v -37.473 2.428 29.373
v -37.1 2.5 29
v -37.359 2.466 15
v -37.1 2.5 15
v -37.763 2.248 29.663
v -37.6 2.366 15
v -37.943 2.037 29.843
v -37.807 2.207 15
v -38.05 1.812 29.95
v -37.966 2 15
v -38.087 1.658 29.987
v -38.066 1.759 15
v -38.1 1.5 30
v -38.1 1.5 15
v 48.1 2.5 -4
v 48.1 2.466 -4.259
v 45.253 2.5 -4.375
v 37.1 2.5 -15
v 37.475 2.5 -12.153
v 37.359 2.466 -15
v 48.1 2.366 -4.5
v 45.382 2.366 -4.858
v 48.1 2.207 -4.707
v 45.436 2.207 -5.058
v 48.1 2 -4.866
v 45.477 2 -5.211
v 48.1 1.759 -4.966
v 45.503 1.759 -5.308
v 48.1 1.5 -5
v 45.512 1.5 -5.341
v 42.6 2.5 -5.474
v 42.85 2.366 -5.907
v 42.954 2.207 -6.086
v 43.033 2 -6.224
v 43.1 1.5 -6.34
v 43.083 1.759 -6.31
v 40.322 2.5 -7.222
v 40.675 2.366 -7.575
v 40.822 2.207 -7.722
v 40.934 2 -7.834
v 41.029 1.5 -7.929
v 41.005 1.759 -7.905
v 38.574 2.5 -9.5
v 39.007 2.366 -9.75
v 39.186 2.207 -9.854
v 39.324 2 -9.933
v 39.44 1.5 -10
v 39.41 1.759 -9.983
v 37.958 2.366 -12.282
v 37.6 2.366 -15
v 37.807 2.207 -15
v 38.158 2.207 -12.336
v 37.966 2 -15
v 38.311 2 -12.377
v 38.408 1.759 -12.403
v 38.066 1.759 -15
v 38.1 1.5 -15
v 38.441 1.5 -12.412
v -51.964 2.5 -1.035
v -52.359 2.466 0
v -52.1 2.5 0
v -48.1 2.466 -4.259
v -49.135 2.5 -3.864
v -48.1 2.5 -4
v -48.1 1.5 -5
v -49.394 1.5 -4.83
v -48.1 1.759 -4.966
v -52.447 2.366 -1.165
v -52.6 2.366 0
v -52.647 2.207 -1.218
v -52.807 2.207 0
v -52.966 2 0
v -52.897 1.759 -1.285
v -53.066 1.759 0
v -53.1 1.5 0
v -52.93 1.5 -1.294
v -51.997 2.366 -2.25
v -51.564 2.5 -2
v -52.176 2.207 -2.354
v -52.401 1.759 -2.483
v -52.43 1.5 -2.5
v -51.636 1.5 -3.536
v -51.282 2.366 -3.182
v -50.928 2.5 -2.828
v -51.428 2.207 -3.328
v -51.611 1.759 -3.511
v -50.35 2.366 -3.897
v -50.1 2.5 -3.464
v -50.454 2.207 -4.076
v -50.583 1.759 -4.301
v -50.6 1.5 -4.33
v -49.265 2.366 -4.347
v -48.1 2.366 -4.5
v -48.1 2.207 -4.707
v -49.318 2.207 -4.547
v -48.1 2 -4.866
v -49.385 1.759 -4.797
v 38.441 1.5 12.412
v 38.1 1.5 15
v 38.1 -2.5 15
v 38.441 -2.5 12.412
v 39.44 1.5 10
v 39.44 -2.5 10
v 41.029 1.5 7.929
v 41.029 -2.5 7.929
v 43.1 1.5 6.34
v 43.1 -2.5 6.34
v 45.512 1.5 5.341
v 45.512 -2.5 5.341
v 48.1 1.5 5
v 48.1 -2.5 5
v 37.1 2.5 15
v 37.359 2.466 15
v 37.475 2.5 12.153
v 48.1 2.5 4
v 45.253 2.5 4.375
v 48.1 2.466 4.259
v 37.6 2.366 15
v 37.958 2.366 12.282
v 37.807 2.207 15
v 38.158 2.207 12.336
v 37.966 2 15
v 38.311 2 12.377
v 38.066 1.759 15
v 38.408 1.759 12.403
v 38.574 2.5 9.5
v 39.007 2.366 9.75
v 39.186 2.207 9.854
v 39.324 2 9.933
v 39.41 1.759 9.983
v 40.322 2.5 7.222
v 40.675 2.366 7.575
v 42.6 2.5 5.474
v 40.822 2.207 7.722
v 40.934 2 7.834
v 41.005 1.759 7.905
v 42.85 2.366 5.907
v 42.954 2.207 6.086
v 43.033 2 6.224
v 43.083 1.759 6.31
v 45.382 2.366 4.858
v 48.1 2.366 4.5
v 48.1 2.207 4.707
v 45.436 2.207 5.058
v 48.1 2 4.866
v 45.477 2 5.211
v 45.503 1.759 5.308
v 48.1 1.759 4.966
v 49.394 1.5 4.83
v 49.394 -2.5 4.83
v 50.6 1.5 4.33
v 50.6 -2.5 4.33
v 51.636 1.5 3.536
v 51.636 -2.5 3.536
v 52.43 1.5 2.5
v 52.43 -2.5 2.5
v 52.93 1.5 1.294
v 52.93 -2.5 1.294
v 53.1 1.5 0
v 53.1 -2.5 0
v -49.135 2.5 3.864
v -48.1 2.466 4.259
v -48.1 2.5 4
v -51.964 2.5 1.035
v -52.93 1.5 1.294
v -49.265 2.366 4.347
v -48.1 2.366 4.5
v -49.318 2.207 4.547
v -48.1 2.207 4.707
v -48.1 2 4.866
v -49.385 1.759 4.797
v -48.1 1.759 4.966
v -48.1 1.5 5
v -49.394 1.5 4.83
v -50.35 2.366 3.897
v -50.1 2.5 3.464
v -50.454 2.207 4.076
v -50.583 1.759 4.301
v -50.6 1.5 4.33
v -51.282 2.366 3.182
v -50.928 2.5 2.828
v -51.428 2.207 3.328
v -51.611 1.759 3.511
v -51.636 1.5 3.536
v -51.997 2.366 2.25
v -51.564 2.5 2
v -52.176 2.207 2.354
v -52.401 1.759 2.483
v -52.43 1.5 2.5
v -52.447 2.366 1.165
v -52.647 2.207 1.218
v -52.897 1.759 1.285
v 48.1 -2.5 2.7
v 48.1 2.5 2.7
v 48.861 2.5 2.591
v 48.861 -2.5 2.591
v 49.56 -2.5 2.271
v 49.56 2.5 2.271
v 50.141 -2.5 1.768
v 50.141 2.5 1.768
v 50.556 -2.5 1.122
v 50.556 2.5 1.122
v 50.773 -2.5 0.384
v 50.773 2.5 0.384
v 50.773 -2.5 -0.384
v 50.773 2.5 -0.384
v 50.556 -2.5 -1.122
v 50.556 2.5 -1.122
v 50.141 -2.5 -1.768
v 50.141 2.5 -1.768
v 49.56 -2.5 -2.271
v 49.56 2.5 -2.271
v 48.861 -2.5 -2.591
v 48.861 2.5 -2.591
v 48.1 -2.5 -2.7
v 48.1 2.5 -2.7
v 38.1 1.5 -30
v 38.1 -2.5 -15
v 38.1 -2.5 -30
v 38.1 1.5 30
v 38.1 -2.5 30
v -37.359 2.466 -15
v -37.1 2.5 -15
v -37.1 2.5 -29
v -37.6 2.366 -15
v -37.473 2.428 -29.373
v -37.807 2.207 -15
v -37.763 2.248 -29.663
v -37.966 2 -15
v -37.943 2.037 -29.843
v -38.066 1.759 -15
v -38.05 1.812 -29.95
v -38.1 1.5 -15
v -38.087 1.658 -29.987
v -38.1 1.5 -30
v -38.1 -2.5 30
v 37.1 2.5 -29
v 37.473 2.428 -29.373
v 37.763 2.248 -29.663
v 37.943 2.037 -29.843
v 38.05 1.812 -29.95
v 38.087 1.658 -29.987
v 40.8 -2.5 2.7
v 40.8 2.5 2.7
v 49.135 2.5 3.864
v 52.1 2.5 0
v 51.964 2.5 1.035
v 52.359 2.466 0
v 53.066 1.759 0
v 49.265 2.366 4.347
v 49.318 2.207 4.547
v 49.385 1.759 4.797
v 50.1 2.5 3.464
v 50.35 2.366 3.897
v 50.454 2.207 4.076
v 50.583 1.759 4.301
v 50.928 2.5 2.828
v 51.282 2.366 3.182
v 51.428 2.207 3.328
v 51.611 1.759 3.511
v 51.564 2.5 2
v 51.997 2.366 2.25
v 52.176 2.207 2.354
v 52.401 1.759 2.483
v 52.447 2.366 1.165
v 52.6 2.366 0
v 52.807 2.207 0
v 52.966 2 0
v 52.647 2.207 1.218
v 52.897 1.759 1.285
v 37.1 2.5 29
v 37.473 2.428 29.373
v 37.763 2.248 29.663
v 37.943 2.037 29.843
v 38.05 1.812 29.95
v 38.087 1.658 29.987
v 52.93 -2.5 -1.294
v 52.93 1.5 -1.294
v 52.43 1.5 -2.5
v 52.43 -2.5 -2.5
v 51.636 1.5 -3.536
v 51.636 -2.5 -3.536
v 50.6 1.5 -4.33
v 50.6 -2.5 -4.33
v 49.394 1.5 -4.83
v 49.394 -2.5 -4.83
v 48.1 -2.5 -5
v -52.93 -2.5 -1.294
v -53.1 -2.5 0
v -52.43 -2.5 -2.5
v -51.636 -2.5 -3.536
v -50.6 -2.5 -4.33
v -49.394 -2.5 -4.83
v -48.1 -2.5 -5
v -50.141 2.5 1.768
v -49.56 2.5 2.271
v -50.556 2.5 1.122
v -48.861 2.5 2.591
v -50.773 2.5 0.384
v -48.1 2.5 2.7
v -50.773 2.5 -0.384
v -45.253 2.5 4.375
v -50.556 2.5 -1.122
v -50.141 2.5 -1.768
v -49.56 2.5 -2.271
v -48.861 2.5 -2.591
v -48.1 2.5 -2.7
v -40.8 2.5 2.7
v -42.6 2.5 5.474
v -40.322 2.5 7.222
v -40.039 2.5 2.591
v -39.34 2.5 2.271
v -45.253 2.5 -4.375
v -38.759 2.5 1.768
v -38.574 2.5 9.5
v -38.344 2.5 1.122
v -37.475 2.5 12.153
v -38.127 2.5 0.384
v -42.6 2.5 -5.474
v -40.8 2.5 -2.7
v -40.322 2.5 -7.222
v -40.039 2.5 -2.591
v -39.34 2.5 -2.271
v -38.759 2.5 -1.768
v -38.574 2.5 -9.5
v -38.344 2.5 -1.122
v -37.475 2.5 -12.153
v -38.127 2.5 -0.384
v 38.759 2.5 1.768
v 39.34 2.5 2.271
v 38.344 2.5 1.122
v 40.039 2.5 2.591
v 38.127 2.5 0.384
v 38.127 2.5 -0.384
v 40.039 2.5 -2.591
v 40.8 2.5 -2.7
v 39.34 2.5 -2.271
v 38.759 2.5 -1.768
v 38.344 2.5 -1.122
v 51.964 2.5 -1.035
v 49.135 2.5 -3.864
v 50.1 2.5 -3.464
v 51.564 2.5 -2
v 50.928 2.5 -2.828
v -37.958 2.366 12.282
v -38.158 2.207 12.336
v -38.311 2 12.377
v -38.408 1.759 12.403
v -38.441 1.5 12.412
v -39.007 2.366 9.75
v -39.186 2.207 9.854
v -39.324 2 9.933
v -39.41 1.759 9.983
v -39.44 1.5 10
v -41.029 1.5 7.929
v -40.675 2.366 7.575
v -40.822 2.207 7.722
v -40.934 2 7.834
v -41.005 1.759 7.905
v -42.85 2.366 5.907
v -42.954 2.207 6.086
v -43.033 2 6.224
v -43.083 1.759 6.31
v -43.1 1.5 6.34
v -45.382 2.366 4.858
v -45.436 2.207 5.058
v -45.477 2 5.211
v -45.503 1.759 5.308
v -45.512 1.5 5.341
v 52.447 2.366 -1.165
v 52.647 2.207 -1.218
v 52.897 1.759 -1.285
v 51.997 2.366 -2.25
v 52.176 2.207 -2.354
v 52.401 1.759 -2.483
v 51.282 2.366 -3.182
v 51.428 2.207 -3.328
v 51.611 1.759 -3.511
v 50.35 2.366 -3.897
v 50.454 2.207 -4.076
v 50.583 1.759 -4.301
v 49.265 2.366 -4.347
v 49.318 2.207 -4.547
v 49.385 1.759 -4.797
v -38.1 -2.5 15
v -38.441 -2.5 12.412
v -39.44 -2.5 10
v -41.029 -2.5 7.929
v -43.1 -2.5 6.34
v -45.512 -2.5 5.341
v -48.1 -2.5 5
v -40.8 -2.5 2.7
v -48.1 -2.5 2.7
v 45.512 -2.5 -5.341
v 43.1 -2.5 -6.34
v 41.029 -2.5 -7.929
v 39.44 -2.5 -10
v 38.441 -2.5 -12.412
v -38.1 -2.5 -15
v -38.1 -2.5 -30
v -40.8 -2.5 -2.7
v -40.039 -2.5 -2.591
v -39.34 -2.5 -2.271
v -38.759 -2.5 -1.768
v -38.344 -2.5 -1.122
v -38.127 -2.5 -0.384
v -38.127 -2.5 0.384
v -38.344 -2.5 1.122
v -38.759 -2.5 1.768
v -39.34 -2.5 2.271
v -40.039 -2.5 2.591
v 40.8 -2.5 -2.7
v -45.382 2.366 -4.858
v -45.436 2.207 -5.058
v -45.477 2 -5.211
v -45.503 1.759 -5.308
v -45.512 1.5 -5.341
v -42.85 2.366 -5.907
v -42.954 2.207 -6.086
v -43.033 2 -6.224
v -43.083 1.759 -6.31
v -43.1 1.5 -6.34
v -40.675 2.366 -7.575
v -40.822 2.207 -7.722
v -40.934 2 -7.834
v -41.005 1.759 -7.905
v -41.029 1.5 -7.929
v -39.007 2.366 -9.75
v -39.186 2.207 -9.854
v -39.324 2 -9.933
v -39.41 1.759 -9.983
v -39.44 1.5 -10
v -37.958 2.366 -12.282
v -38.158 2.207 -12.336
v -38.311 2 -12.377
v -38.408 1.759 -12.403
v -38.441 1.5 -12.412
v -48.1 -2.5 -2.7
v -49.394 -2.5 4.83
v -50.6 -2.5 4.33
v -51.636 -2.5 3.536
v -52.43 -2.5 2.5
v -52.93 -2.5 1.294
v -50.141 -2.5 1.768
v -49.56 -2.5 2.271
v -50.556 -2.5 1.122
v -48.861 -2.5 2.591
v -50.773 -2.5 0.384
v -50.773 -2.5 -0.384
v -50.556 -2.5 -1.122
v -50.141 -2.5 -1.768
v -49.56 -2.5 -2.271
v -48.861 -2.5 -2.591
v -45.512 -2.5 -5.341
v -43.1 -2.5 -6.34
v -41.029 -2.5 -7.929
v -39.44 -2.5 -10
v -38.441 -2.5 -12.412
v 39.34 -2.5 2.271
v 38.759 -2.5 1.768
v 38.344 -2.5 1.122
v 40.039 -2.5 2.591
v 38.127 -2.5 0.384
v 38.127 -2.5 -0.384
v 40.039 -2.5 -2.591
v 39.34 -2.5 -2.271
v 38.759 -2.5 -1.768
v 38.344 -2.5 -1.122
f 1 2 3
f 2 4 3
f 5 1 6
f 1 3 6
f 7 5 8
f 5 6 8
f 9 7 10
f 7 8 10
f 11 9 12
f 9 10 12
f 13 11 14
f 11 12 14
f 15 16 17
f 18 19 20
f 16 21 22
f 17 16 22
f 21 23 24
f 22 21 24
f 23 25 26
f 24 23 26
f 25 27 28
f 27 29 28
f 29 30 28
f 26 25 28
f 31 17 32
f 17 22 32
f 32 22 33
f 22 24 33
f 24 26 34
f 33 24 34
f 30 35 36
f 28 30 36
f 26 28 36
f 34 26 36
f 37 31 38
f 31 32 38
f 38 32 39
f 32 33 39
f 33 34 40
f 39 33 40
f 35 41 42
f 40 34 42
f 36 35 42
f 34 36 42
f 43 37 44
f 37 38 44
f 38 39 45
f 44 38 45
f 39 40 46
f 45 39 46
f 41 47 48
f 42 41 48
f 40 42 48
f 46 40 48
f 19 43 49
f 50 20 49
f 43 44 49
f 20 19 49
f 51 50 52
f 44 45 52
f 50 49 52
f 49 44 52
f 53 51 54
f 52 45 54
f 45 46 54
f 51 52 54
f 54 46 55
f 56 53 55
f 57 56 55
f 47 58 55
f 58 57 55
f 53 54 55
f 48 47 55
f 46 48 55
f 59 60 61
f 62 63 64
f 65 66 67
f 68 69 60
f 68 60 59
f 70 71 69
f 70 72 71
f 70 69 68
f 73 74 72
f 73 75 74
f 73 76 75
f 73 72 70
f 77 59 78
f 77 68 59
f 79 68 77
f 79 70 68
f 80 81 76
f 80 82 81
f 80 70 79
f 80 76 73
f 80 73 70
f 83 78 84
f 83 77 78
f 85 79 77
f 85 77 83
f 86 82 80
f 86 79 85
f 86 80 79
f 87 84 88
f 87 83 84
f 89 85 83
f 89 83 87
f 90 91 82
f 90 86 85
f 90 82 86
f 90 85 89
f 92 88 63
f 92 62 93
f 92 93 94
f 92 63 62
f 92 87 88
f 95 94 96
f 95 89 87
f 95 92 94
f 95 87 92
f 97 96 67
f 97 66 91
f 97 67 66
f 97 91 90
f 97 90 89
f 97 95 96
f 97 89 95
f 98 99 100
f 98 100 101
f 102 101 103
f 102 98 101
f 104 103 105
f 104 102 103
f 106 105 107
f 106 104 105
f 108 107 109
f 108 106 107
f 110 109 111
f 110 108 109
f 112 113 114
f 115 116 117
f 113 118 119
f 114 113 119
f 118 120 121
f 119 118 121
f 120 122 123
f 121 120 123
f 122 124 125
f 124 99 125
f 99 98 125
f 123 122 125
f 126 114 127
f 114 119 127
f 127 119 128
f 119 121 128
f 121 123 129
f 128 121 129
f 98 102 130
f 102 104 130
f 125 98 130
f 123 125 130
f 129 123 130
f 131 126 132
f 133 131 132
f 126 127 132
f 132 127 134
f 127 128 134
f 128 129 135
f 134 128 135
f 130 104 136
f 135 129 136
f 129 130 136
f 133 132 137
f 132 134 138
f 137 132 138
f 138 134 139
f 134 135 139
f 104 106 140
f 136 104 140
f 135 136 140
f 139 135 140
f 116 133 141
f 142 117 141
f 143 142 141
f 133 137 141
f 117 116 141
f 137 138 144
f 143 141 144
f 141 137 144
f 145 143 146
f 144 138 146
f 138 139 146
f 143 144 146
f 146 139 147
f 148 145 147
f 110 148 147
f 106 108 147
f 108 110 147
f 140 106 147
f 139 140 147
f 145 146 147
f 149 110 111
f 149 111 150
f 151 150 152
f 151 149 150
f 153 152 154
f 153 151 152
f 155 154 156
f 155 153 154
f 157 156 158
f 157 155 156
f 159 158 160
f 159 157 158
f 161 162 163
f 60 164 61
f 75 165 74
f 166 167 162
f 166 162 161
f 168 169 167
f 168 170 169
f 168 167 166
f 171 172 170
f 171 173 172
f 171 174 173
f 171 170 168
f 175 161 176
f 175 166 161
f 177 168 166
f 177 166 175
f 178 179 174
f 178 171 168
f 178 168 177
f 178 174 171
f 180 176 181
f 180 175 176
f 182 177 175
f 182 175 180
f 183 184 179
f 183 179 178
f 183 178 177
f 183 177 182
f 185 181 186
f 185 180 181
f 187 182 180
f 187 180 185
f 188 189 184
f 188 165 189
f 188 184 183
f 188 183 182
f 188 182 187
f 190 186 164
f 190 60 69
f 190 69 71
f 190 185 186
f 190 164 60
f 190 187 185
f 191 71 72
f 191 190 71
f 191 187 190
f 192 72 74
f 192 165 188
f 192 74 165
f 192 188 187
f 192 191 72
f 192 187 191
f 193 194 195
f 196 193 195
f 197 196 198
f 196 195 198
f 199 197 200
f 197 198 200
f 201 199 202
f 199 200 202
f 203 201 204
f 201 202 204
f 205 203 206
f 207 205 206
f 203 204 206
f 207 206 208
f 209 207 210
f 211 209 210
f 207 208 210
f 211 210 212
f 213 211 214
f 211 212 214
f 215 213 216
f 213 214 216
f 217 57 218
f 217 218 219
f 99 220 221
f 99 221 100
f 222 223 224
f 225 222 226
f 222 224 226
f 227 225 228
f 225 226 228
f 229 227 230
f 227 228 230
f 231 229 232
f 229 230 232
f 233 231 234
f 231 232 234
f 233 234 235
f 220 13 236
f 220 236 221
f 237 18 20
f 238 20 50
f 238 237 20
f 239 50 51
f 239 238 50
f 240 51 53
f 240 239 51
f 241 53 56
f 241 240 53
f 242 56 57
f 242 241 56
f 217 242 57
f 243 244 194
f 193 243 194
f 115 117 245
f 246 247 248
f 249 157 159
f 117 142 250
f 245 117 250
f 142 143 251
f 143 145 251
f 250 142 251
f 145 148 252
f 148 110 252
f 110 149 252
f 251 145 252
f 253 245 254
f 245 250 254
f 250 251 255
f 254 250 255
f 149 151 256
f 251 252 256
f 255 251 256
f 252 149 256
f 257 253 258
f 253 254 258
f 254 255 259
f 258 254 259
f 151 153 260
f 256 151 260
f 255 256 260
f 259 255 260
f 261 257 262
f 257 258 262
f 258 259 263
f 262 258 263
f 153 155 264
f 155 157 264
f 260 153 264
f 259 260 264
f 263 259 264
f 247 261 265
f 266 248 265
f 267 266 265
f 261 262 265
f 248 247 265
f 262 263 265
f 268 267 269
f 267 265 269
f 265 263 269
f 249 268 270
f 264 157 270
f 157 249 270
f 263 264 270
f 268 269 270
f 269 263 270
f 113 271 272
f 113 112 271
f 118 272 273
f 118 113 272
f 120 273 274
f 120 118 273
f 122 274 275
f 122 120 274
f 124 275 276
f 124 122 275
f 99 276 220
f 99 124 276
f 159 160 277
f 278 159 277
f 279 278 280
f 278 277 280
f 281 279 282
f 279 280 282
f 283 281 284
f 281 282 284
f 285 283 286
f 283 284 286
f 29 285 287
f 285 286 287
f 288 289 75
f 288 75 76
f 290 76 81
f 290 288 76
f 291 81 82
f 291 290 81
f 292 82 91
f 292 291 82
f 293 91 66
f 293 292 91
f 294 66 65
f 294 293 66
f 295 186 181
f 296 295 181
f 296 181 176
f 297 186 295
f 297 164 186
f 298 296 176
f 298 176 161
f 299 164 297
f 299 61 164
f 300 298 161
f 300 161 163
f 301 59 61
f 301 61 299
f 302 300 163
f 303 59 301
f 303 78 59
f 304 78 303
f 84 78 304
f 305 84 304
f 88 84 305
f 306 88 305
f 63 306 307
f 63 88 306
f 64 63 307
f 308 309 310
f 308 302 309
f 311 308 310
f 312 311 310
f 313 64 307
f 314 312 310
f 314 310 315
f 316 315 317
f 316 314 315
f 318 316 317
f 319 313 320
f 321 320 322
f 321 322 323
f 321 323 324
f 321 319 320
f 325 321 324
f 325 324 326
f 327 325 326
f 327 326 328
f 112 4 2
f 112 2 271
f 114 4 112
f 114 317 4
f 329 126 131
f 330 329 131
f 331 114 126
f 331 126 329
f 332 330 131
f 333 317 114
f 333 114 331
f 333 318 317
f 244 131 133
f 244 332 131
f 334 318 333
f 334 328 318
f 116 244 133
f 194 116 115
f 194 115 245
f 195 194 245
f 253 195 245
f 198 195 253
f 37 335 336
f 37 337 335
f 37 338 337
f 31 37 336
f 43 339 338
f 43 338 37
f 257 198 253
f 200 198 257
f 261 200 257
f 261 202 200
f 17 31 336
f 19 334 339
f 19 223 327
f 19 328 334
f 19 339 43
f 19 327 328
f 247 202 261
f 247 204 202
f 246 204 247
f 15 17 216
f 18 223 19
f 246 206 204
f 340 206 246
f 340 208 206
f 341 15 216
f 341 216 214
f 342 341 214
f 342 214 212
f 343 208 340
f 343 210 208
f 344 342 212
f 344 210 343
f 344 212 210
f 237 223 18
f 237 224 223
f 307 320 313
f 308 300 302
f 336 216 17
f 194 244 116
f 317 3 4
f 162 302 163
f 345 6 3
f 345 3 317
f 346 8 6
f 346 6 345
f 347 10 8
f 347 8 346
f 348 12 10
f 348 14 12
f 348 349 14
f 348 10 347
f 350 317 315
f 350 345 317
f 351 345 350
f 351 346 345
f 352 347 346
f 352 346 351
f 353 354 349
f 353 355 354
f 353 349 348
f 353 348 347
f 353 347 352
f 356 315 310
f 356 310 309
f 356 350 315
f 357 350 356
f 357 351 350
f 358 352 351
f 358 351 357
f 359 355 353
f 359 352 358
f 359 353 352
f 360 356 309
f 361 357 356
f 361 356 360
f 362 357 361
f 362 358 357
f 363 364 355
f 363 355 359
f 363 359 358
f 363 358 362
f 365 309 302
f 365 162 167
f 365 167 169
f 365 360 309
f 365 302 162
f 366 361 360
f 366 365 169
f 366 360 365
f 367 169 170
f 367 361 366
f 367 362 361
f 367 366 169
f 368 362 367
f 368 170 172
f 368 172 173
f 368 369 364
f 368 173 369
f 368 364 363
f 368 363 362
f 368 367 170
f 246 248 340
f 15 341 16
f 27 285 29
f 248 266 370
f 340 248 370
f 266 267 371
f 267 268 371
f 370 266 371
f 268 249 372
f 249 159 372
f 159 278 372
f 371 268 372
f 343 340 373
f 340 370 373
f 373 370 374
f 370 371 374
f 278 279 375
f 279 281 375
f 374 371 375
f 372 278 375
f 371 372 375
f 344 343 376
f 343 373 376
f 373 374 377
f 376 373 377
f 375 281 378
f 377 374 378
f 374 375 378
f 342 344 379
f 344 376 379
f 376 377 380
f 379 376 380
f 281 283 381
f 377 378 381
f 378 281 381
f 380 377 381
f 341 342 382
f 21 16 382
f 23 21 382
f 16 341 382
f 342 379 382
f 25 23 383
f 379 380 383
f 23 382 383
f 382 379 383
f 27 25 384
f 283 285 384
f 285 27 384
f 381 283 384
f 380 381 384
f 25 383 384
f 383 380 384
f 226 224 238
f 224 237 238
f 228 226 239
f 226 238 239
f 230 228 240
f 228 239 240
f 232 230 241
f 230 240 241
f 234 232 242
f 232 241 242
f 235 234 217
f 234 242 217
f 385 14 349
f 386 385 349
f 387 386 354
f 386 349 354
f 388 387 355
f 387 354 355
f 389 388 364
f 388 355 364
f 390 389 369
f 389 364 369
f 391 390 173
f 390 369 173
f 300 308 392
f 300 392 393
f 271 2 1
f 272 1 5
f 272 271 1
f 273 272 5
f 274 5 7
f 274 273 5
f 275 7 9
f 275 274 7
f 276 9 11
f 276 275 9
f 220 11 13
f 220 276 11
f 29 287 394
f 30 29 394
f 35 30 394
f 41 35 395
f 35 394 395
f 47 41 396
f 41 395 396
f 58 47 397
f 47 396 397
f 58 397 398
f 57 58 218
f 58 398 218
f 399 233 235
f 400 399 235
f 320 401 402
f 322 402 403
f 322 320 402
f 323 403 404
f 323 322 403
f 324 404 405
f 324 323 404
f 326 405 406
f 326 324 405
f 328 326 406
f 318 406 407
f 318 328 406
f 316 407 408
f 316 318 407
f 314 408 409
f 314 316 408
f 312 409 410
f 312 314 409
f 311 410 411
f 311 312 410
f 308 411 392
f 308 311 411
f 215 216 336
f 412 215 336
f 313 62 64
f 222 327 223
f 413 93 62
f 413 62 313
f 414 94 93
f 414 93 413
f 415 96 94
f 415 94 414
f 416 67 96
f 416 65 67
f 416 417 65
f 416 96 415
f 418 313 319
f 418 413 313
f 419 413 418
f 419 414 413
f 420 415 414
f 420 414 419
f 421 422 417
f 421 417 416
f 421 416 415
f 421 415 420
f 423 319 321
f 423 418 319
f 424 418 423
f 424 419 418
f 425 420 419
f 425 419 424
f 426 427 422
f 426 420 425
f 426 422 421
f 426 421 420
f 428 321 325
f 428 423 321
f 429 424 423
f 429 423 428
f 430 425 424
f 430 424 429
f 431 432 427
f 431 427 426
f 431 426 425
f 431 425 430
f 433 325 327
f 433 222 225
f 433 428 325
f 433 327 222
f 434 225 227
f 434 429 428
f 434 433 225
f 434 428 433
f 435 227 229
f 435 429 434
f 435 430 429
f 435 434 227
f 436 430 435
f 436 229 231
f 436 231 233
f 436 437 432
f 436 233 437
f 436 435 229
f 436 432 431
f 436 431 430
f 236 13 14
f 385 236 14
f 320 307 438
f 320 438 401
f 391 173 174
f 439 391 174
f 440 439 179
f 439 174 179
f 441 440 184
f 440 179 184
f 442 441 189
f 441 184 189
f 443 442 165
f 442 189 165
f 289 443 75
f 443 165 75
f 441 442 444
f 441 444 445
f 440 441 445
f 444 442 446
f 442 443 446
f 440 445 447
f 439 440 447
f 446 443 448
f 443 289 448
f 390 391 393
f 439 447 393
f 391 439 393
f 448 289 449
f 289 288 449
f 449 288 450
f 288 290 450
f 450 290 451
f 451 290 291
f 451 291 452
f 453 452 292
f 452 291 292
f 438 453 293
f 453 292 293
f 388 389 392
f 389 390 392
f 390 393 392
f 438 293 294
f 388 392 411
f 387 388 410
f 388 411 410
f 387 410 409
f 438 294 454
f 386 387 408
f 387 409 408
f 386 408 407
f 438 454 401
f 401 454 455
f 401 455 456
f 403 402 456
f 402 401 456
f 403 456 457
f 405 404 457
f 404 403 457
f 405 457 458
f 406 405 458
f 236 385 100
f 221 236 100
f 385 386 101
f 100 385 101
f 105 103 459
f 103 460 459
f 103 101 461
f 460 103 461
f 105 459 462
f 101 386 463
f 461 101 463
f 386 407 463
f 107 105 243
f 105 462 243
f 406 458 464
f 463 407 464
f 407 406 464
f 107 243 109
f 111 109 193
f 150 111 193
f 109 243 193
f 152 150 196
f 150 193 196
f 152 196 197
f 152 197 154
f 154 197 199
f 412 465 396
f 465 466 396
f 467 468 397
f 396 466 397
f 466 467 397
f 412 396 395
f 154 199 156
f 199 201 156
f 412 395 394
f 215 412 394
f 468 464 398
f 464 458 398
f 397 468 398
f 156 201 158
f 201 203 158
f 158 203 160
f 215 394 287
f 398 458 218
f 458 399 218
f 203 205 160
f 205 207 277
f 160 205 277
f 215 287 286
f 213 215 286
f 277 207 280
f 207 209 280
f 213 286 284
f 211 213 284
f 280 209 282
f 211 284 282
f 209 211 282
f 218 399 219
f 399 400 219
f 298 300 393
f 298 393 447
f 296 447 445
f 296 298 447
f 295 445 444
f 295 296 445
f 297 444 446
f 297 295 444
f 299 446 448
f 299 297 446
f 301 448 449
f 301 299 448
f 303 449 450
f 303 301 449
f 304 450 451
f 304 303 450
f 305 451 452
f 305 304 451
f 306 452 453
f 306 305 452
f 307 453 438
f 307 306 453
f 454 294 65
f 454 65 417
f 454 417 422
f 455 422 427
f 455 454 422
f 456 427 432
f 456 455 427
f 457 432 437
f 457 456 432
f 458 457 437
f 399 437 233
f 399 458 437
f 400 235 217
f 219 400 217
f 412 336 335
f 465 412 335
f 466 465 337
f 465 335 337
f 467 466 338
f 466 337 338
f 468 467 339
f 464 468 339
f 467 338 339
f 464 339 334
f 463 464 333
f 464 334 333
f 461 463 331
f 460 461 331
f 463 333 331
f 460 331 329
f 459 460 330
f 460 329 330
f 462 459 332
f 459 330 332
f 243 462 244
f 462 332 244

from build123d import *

# Parameters (mm, degrees)
SKETCH1_W           = 76.2
SKETCH1_H           = 60
BOSS_EXTRUDE1_DEPTH = 2.5
SKETCH2_W           = 15
SKETCH2_H           = 10
BOSS_EXTRUDE2_DEPTH = 2.5
CUT_EXTRUDE1_DEPTH  = 10
FILLET1_R           = 10
FILLET2_R           = 5
FILLET3_R           = 1


with BuildPart() as part:
    # Sketch1 → Boss-Extrude1 (new, symmetric)
    with BuildSketch(Plane(origin=(0, 0, 0), x_dir=(1, 0, 0), z_dir=(0, 1, 0))):
        Rectangle(SKETCH1_W, SKETCH1_H)
    extrude(amount=BOSS_EXTRUDE1_DEPTH, both=True)

    # Sketch2 → Boss-Extrude2 (add, symmetric)
    with BuildSketch(Plane(origin=(0, 0, 0), x_dir=(1, 0, 0), z_dir=(0, 1, 0))):
        with Locations((-45.6, 0)):
            Rectangle(SKETCH2_W, SKETCH2_H)
    boss_extrude2 = extrude(amount=BOSS_EXTRUDE2_DEPTH, both=True)

    # Sketch3 → Cut-Extrude1 (cut)
    with BuildSketch(Plane(origin=(0, 2.5, 0), x_dir=(1, 0, 0), z_dir=(0, 1, 0))):
        with BuildLine():
            Line((-48.1, 2.7), (-40.8, 2.7))
            ThreePointArc((-40.8, 2.7), (-38.1, 0), (-40.8, -2.7))
            Line((-40.8, -2.7), (-48.1, -2.7))
            ThreePointArc((-48.1, -2.7), (-50.8, 0), (-48.1, 2.7))
        make_face()
    cut_extrude1 = extrude(amount=-CUT_EXTRUDE1_DEPTH, mode=Mode.SUBTRACT)

    # Mirror4: Boss-Extrude2, Cut-Extrude1 across plane
    add(boss_extrude2.mirror(Plane(origin=(0, 0, 0), x_dir=(0, 0, 1), z_dir=(1, 0, 0))))
    add(cut_extrude1.mirror(Plane(origin=(0, 0, 0), x_dir=(0, 0, 1), z_dir=(1, 0, 0))), mode=Mode.SUBTRACT)

    # Fillet1
    fillet1_edges = [part.edges().sort_by_distance(p)[0] for p in [
        (-38.1, 0, 5),
        (-38.1, 0, -5),
        (38.1, 0, -5),
        (38.1, 0, 5),
    ]]
    fillet(fillet1_edges, radius=FILLET1_R)

    # Fillet2
    fillet2_edges = [part.edges().sort_by_distance(p)[0] for p in [
        (-53.1, 0, -5),
        (-53.1, 0, 5),
        (53.1, 0, -5),
        (53.1, 0, 5),
    ]]
    fillet(fillet2_edges, radius=FILLET2_R - 0.0001)  # a hair under: the kernel refuses the full size

    # Fillet3
    fillet3_edges = [part.edges().sort_by_distance(p)[0] for p in [
        (38.1, 2.5, 22.5),
        (-51.635563195, 2.5, 3.535563195),
        (-51.635563195, 2.5, -3.535563195),
        (51.635563195, 2.5, 3.535563195),
        (51.635563195, 2.5, -3.535563195),
        (0, 2.5, -30),
        (-38.1, 2.5, -22.5),
        (0, 2.5, 30),
        (38.1, 2.5, -22.5),
        (-38.1, 2.5, 22.5),
        (41.028932188, 2.5, -7.928932188),
        (41.028932188, 2.5, 7.928932188),
        (-41.028932188, 2.5, -7.928932188),
        (-41.028932188, 2.5, 7.928932188),
    ]]
    fillet(fillet3_edges, radius=FILLET3_R)


solid = part.part
